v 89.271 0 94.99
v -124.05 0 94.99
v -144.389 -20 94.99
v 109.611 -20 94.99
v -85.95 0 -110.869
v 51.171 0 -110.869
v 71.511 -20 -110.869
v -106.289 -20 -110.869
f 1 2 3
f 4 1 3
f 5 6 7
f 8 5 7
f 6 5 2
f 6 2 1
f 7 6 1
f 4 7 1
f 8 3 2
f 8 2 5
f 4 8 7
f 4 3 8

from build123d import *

# Parameters (mm, degrees)
F1_DEPTH = 20
F2_SIZE  = 19.99999
F3_SIZE  = 19.99999


# Not quite as in the source:
# - a fillet or chamfer is up to 0.001 mm smaller than in the source, because OpenCascade refuses the exact size


with BuildPart() as f1:
    # F0 (on Front) → F1 (new body)
    with BuildSketch(Plane.XZ):
        Polygon((-106.2891499103, -110.869043763), (71.5108500897, -110.869043763), (109.6108500897, 94.9895840839), (-144.3891499103, 94.9895840839), align=None)
    extrude(amount=F1_DEPTH)

    # F2 (size 20 in the source; OpenCascade refuses exactly that, so slightly less here)
    f2_edges = [f1.edges().sort_by_distance(p)[0] for p in [
        (90.56085, 0, -7.93973),
    ]]
    chamfer(f2_edges, length=F2_SIZE)

    # F3 (size 20 in the source; OpenCascade refuses exactly that, so slightly less here)
    f3_edges = [f1.edges().sort_by_distance(p)[0] for p in [
        (-125.33915, 0, -7.93973),
    ]]
    chamfer(f3_edges, length=F3_SIZE)


solid = f1.part
